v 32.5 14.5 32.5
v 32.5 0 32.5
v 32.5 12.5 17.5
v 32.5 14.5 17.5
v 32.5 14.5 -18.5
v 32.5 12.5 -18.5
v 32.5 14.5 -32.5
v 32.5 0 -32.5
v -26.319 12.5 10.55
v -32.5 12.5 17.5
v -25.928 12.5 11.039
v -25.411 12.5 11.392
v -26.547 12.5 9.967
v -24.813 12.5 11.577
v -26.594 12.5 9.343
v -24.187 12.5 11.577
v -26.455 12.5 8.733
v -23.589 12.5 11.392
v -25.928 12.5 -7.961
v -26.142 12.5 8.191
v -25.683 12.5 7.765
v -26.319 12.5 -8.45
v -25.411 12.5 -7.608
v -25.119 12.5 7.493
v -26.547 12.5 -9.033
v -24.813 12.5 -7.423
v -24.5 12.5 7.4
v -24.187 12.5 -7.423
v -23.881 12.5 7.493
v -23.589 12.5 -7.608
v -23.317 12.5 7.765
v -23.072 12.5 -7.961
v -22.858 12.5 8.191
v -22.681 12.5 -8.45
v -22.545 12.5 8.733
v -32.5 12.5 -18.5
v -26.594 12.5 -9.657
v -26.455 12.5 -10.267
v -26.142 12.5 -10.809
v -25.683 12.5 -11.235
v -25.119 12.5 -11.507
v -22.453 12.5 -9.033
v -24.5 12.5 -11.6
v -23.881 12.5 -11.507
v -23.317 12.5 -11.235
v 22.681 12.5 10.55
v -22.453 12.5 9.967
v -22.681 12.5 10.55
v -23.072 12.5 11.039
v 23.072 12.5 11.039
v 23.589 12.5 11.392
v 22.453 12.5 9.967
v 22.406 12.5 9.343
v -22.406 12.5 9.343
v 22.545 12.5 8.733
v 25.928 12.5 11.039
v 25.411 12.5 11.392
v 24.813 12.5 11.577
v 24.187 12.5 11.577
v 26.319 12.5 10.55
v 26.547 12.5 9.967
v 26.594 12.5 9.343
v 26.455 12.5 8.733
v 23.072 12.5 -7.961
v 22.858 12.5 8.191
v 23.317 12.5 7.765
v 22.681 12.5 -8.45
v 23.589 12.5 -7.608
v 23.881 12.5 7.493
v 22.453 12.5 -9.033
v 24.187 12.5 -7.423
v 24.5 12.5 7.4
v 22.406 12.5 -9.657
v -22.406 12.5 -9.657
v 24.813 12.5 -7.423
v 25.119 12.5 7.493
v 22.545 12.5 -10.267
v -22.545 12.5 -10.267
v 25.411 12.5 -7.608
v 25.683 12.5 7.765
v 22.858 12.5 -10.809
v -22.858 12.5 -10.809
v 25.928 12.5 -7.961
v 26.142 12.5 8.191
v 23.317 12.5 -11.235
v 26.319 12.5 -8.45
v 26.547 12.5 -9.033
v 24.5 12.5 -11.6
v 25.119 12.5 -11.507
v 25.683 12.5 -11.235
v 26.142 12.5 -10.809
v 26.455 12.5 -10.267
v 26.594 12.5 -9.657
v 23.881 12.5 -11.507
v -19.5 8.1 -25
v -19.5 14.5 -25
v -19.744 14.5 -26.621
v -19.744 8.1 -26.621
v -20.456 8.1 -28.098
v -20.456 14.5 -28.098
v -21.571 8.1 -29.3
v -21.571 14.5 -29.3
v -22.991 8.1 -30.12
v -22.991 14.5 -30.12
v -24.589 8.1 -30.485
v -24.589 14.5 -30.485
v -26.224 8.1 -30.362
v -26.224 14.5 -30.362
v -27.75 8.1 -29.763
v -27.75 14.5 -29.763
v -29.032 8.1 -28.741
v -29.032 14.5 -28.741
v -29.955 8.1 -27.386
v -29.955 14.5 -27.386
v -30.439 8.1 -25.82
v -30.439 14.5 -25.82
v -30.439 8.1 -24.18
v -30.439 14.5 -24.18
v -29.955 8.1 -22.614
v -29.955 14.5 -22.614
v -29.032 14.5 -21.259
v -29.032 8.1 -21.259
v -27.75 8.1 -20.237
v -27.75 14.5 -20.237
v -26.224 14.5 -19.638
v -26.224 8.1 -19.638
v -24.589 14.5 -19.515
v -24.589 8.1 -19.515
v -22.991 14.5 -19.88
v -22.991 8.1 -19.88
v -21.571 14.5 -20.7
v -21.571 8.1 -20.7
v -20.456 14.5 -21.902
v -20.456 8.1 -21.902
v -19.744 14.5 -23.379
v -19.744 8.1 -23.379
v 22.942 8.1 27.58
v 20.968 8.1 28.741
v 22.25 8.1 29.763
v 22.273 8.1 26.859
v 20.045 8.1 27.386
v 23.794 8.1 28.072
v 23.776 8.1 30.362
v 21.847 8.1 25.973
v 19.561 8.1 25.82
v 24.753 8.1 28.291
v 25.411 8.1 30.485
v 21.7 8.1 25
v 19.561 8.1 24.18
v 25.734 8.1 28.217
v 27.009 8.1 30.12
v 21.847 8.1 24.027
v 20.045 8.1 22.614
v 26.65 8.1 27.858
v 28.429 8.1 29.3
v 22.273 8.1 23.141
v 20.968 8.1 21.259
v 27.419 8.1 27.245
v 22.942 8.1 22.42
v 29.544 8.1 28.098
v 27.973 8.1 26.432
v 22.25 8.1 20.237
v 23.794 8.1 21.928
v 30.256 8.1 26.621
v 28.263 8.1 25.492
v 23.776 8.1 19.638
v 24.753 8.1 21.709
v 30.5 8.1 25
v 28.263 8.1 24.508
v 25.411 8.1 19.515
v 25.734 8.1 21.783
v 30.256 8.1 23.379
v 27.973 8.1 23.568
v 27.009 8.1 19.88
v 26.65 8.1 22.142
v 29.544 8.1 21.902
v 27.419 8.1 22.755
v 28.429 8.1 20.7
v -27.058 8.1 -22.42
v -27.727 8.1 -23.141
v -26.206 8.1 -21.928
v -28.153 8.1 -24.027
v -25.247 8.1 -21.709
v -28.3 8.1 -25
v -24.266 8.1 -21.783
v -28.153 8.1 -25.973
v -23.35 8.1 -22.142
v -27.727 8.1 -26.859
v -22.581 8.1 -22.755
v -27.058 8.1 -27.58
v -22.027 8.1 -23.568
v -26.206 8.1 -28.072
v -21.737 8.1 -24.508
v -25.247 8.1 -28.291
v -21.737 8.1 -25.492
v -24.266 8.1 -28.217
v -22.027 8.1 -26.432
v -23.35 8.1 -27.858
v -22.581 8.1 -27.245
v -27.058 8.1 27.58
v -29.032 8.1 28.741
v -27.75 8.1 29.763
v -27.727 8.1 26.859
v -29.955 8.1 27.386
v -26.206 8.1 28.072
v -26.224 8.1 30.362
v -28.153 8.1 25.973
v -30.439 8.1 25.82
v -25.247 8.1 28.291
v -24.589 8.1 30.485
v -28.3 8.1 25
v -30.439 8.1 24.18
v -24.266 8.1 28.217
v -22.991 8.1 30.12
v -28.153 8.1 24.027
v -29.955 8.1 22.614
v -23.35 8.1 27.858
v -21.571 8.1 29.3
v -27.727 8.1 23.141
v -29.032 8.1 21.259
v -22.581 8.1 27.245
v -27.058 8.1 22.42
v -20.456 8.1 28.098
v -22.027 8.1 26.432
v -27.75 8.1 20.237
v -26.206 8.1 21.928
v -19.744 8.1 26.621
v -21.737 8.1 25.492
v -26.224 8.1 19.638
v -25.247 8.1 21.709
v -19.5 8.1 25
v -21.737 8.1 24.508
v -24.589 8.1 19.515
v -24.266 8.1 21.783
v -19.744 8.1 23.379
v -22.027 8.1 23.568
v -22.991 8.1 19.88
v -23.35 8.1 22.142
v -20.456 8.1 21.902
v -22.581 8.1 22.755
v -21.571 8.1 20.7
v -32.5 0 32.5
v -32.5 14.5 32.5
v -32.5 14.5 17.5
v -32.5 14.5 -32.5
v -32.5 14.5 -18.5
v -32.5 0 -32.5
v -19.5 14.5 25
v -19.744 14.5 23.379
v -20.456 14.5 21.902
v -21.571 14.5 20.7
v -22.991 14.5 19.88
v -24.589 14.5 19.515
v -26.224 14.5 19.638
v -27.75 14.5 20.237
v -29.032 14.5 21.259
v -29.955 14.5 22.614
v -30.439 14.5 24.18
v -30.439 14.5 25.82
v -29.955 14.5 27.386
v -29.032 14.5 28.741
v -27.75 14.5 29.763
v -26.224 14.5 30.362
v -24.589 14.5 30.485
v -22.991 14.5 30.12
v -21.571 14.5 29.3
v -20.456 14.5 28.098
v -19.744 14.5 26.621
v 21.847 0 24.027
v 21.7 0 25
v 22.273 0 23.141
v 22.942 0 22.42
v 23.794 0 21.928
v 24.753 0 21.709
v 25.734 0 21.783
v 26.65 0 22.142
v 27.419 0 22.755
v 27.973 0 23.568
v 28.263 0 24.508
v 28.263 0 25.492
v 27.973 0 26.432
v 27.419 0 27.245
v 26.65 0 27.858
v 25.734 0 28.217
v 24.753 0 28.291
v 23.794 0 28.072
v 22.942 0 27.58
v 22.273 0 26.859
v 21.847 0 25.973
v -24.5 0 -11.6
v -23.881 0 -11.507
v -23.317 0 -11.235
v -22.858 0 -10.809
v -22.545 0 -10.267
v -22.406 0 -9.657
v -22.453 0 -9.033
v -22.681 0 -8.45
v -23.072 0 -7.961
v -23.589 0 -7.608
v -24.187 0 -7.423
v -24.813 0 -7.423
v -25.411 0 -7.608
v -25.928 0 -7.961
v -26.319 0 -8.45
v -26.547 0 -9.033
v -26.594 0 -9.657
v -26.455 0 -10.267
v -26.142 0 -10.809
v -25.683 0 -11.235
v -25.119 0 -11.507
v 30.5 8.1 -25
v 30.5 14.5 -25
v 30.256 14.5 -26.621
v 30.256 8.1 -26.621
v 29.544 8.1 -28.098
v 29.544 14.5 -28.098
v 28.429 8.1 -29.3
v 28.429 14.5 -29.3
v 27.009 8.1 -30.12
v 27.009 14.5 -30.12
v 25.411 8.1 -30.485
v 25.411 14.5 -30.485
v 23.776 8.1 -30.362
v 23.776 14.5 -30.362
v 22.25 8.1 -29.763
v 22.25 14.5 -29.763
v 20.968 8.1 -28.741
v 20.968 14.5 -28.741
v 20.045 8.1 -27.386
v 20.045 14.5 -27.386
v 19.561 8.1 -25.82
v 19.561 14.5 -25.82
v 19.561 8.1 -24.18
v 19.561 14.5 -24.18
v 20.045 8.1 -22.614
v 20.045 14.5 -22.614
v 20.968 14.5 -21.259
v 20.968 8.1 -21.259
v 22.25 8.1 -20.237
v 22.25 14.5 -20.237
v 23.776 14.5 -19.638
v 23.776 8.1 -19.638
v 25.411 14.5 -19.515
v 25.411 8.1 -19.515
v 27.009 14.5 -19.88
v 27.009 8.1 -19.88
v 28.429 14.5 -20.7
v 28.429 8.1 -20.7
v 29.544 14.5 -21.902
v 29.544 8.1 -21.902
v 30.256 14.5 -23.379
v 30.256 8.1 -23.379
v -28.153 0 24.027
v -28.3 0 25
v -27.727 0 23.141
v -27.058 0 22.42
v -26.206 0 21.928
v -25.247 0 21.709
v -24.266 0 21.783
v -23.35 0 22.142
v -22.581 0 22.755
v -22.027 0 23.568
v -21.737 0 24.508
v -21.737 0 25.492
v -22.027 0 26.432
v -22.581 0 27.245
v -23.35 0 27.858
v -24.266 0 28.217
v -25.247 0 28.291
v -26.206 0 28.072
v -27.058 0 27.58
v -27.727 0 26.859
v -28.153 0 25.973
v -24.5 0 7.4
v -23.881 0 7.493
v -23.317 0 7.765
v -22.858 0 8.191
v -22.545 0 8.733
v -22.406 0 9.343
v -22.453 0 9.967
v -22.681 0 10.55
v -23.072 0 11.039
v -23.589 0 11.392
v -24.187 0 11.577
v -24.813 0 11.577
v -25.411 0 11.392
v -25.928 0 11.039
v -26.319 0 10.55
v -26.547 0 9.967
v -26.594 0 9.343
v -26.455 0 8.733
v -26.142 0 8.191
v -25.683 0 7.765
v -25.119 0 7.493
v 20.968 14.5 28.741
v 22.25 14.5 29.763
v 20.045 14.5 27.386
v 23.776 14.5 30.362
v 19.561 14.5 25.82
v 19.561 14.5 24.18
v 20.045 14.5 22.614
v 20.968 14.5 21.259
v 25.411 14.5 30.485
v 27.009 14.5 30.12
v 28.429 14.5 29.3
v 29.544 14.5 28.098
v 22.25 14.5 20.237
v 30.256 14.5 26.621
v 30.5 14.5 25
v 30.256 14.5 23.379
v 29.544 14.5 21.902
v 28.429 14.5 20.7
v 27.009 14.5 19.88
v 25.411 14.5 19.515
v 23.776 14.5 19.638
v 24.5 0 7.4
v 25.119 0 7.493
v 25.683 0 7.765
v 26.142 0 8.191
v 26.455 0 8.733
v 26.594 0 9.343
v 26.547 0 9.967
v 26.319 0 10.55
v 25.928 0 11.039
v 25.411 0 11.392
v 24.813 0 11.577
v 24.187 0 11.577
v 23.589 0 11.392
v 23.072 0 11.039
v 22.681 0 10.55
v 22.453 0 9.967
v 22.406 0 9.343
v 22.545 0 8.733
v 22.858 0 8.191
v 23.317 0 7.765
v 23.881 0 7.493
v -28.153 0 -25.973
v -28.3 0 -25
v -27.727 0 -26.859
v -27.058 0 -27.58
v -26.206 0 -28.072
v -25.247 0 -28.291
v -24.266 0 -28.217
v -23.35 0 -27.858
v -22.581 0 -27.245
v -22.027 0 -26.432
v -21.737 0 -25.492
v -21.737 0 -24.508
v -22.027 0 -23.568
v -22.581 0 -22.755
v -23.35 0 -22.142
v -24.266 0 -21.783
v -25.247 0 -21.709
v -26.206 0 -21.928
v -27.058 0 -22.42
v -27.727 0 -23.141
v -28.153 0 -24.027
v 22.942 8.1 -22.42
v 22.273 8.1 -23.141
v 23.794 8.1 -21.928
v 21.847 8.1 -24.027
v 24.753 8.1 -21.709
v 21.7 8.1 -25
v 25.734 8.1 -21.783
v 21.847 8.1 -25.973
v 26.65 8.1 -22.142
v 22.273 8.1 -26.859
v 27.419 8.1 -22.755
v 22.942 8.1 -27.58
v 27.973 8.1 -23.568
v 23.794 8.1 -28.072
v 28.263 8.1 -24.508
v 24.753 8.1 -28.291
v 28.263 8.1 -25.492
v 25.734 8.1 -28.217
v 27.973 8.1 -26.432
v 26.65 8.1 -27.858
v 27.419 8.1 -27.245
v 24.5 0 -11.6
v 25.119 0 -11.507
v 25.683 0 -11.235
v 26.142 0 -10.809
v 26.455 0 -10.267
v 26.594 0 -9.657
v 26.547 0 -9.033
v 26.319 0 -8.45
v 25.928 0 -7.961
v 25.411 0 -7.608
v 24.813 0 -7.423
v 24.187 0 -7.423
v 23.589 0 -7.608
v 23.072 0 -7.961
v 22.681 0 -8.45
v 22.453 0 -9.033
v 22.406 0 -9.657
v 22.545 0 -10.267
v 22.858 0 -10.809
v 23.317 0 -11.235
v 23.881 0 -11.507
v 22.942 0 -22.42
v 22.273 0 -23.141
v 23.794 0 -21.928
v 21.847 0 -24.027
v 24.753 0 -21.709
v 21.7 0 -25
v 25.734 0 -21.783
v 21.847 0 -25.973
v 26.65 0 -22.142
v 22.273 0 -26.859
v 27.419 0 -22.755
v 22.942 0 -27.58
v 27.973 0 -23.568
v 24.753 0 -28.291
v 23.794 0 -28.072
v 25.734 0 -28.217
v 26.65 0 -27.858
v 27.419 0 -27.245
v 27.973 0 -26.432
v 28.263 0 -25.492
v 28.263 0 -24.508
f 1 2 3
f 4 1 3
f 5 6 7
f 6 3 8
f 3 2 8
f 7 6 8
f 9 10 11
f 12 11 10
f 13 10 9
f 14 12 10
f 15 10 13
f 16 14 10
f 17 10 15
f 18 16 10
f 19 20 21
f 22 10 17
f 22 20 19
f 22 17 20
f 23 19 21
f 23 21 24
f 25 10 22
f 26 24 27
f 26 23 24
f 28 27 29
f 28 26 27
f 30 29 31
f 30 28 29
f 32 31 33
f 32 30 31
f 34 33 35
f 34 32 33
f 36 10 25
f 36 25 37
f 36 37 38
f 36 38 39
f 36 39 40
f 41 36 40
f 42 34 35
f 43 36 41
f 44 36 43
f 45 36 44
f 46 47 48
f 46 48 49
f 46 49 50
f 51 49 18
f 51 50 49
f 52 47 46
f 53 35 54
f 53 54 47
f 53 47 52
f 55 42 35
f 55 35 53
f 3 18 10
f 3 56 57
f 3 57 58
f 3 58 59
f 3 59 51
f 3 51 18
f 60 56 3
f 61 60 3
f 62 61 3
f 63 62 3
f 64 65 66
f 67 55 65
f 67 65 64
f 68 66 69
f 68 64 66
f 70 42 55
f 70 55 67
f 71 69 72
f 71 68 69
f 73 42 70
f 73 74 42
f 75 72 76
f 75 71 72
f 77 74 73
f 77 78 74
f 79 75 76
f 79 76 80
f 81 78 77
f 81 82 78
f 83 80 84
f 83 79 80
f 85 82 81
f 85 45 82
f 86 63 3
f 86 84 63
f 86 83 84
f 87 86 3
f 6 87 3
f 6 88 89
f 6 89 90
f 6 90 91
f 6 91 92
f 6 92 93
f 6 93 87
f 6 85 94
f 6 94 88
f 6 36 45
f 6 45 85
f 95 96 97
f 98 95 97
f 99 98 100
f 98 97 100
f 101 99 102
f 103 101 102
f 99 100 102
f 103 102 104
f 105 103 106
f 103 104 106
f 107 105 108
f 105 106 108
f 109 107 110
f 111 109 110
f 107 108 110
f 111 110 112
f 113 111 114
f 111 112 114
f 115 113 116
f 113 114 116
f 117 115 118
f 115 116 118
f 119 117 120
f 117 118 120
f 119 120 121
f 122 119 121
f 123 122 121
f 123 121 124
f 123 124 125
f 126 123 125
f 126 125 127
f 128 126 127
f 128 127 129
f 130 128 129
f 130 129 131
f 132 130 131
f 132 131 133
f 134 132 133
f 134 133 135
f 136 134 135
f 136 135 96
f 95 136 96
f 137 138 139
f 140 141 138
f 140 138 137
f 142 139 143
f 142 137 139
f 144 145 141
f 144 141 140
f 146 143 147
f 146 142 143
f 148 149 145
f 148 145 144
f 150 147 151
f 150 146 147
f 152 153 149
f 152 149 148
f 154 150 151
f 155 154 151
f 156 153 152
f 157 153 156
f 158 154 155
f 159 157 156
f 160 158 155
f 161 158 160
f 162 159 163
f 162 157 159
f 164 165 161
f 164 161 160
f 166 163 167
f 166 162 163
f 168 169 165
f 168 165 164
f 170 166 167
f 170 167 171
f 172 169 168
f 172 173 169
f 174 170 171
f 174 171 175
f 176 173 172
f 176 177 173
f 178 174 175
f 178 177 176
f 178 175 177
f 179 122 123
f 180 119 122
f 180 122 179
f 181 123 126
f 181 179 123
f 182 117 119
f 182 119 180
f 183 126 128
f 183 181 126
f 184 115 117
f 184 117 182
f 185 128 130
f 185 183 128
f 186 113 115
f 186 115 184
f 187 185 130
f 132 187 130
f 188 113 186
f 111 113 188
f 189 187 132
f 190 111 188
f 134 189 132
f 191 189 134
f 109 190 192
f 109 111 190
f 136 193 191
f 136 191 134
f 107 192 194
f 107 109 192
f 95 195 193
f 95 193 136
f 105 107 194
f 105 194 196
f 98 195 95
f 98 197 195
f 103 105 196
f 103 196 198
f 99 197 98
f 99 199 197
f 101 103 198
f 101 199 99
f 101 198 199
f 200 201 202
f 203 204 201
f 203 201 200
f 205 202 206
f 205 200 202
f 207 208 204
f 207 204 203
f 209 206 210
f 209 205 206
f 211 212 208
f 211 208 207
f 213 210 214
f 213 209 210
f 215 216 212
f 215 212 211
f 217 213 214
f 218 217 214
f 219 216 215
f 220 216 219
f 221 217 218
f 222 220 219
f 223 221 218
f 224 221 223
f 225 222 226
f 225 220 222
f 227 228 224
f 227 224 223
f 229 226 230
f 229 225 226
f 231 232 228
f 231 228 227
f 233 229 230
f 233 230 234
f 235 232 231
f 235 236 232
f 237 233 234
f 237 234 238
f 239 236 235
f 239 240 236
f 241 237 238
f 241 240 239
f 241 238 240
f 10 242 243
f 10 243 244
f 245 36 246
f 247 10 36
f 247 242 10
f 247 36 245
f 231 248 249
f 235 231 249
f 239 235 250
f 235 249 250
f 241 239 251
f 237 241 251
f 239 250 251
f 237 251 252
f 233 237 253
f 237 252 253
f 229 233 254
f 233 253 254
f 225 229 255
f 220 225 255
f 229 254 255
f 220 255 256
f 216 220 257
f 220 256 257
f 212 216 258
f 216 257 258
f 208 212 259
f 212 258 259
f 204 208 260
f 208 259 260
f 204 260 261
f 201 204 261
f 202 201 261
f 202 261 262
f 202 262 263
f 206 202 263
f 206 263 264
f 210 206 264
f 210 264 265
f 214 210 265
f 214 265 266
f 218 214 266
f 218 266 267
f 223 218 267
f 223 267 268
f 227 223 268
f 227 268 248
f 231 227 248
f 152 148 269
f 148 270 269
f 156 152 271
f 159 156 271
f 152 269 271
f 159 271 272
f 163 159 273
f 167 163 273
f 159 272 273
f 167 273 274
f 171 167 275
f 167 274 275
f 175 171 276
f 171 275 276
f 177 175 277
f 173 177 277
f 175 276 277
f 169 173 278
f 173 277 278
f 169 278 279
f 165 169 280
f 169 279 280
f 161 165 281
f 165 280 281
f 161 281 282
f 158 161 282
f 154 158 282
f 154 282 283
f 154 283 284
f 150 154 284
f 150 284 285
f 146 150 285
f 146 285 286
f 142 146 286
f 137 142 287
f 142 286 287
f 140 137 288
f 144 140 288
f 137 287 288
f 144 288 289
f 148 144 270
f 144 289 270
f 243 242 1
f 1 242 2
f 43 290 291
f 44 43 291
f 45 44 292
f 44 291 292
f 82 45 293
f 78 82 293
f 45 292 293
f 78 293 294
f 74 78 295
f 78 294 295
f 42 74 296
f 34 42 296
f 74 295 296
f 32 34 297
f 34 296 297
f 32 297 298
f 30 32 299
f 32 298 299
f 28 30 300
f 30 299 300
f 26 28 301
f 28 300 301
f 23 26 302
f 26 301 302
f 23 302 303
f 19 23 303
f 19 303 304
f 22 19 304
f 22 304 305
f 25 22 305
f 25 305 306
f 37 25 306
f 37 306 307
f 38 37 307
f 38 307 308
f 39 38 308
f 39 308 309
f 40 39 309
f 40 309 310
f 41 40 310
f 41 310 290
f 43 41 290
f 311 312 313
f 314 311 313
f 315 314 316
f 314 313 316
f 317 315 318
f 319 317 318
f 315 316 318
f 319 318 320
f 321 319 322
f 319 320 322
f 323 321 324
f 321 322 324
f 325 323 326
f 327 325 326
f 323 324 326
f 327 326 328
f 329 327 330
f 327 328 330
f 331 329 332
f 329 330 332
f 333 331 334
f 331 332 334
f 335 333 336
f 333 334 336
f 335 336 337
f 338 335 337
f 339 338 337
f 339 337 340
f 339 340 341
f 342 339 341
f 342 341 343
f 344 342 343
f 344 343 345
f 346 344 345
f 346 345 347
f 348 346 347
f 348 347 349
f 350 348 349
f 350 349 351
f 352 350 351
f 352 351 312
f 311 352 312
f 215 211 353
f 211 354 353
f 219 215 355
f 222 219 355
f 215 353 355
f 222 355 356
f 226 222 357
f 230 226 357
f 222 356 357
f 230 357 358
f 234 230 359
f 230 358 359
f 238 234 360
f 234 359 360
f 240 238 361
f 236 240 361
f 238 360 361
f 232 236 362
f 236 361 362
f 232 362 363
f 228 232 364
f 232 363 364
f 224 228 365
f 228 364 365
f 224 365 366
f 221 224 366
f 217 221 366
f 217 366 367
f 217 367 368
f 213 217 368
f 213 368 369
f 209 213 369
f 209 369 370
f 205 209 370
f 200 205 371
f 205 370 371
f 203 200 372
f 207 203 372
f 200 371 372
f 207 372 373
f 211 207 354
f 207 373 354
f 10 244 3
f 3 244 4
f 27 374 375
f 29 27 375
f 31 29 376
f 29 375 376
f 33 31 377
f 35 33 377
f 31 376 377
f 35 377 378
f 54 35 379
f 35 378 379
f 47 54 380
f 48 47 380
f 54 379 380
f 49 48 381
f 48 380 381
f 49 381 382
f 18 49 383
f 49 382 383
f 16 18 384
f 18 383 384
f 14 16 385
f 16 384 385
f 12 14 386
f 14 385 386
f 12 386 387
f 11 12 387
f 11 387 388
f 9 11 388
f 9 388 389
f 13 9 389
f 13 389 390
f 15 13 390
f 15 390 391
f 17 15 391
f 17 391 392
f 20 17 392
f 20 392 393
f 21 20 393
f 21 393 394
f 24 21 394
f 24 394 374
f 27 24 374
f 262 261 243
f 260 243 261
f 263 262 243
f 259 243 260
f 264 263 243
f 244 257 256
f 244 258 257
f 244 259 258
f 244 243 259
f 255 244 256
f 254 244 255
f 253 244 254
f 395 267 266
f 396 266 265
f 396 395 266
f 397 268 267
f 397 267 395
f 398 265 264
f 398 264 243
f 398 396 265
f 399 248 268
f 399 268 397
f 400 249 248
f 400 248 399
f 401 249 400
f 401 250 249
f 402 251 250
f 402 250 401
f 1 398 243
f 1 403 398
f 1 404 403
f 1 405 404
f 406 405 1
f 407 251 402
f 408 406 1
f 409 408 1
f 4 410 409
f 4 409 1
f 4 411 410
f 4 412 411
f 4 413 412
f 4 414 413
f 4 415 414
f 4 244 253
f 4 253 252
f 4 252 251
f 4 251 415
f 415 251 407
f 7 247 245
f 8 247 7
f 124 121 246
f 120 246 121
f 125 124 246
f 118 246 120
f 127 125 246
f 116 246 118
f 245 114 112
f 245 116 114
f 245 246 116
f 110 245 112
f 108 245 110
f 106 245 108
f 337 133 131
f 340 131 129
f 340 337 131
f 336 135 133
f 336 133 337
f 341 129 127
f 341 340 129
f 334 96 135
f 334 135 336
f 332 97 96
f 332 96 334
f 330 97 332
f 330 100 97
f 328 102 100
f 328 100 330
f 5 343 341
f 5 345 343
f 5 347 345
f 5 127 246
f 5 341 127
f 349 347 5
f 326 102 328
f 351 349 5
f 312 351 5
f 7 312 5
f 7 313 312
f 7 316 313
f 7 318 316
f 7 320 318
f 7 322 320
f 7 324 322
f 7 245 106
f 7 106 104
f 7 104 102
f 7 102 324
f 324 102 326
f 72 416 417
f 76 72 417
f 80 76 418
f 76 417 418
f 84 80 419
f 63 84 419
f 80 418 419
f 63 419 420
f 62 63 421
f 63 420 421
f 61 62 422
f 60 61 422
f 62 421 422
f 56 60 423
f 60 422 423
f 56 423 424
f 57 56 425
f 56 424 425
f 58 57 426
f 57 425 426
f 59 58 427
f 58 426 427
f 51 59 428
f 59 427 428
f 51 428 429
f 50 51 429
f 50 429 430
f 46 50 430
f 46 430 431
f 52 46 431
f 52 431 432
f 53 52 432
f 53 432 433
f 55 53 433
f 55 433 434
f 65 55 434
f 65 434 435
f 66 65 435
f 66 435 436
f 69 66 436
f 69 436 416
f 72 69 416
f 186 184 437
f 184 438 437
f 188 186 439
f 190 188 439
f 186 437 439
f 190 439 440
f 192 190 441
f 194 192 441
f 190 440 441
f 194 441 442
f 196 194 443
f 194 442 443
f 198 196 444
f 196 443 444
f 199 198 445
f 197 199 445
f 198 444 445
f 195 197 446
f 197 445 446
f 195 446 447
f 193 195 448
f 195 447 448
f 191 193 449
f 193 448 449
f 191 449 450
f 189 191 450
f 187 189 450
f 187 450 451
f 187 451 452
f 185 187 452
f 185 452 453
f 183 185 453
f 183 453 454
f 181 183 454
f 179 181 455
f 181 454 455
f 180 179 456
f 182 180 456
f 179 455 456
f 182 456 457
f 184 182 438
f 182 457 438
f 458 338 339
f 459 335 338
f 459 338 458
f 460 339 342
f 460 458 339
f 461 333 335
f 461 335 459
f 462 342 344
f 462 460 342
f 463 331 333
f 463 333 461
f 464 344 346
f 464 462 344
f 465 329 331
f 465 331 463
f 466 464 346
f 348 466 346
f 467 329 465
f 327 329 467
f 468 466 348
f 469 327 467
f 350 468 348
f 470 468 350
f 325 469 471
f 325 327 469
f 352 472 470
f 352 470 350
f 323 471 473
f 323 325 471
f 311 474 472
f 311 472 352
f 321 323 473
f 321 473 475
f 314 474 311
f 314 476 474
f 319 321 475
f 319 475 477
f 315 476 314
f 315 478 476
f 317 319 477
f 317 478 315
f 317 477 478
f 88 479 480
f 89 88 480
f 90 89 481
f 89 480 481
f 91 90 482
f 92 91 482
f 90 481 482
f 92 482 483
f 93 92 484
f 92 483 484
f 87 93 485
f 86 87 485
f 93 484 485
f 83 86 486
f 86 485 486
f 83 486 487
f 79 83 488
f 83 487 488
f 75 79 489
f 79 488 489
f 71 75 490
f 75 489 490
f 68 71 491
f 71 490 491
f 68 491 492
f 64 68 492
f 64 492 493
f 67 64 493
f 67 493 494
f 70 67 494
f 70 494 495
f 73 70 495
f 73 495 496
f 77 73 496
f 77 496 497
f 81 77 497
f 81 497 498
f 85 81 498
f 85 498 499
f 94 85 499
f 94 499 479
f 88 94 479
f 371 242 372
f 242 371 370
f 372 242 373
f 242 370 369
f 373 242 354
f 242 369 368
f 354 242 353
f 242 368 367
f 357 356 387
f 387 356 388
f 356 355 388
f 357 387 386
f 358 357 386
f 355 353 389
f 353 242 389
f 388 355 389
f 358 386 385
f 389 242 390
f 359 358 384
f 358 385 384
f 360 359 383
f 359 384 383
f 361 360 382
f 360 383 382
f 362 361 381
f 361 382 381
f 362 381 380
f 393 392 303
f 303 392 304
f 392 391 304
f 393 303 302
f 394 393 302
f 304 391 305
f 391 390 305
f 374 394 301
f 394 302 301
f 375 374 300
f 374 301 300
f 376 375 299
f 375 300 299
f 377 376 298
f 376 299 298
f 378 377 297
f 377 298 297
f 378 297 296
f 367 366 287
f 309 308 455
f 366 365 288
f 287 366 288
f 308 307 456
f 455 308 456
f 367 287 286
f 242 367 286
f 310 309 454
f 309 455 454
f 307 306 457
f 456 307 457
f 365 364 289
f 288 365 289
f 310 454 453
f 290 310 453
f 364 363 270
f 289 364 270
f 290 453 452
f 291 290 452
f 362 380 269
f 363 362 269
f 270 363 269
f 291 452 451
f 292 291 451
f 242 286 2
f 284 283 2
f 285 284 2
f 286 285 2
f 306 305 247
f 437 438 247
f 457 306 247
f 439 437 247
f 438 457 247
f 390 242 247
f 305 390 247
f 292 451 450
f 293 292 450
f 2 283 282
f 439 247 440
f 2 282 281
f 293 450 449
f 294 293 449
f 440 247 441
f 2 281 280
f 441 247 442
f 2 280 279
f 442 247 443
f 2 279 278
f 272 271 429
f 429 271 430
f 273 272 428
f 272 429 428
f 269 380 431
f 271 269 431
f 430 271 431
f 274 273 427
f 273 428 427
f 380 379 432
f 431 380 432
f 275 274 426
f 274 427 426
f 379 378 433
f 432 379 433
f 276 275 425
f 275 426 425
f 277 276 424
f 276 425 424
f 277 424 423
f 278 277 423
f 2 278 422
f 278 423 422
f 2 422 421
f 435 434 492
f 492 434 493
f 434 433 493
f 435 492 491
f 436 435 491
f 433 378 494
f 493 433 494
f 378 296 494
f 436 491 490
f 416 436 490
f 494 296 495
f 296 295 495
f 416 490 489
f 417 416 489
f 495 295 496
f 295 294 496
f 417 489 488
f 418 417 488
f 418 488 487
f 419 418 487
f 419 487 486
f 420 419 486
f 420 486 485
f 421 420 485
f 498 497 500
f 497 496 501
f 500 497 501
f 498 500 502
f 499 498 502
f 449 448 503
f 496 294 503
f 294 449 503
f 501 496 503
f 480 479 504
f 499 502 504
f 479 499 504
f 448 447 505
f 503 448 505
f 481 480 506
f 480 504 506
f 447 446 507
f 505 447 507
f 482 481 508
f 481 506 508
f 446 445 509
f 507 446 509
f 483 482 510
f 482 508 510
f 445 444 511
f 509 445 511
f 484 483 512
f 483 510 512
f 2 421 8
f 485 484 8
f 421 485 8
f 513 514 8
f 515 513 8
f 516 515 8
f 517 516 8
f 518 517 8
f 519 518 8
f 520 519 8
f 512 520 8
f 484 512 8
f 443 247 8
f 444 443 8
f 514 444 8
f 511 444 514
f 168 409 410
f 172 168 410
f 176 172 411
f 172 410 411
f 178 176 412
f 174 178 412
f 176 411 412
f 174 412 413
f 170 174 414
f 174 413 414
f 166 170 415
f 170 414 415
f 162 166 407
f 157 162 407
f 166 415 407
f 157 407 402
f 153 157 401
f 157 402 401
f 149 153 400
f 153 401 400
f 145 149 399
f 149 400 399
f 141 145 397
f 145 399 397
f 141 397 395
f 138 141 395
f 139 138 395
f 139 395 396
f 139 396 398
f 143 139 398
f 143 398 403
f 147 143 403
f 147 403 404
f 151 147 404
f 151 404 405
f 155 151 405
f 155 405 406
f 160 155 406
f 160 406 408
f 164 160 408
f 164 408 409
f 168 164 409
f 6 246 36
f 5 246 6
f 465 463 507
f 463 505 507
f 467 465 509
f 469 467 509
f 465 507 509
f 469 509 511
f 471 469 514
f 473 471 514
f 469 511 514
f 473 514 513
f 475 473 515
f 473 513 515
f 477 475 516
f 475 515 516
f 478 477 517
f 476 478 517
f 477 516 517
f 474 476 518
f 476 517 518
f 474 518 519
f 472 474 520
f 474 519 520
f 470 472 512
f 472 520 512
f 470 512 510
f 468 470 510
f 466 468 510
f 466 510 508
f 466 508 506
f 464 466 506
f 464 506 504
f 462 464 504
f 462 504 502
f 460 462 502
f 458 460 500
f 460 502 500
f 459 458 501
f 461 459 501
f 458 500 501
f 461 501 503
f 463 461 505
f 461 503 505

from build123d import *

# Parameters (mm, degrees)
SKIZZE1_W                                            = 65
SKIZZE1_H                                            = 65
AUFSATZ_LINEAR_AUSTRAGEN1_DEPTH                      = 14.5
STIRNSENKUNG_F_R_M6_ZYLINDERSCHRAUBE_MIT_D           = 6.6
STIRNSENKUNG_F_R_M6_ZYLINDERSCHRAUBE_MIT_CBORE_D     = 11
STIRNSENKUNG_F_R_M6_ZYLINDERSCHRAUBE_MIT_CBORE_DEPTH = 6.4
SKIZZE8_W                                            = 65
SKIZZE8_H                                            = 36
SCHNITT_LINEAR_AUSTRAGEN1_DEPTH                      = 2
KERNLOCH_F_R_M5_GEWINDE1_D                           = 4.2


with BuildPart() as part:
    # Skizze1 → Aufsatz-Linear austragen1 (new body)
    with BuildSketch(Plane(origin=(0, 0, 0), x_dir=(1, 0, 0), z_dir=(0, 1, 0))):
        Rectangle(SKIZZE1_W, SKIZZE1_H)
    extrude(amount=AUFSATZ_LINEAR_AUSTRAGEN1_DEPTH)

    # Stirnsenkung für M6 Zylinderschraube mit Innensechskant1 (through all)
    with Locations(Plane(origin=(0, 14.5, 0), x_dir=(1, 0, 0), z_dir=(0, 1, 0))):
        with Locations((-25, -25), (-25, 25), (25, 25), (25, -25)):
            CounterBoreHole(STIRNSENKUNG_F_R_M6_ZYLINDERSCHRAUBE_MIT_D / 2, STIRNSENKUNG_F_R_M6_ZYLINDERSCHRAUBE_MIT_CBORE_D / 2, STIRNSENKUNG_F_R_M6_ZYLINDERSCHRAUBE_MIT_CBORE_DEPTH)

    # Skizze8 → Schnitt-Linear austragen1 (cut)
    with BuildSketch(Plane(origin=(0, 14.5, 0), x_dir=(1, 0, 0), z_dir=(0, 1, 0))):
        with Locations((0, 0.5)):
            Rectangle(SKIZZE8_W, SKIZZE8_H)
    extrude(amount=-SCHNITT_LINEAR_AUSTRAGEN1_DEPTH, mode=Mode.SUBTRACT)

    # Kernloch für M5 Gewinde1 (through all)
    with Locations(Plane(origin=(61.744554923, 12.5, 78.125902763), x_dir=(0, 0, 1), z_dir=(0, 1, 0))):
        with Locations((-68.625902763, -37.244554923), (-87.625902763, -37.244554923), (-87.625902763, -86.244554923), (-68.625902763, -86.244554923)):
            Hole(KERNLOCH_F_R_M5_GEWINDE1_D / 2)


solid = part.part
